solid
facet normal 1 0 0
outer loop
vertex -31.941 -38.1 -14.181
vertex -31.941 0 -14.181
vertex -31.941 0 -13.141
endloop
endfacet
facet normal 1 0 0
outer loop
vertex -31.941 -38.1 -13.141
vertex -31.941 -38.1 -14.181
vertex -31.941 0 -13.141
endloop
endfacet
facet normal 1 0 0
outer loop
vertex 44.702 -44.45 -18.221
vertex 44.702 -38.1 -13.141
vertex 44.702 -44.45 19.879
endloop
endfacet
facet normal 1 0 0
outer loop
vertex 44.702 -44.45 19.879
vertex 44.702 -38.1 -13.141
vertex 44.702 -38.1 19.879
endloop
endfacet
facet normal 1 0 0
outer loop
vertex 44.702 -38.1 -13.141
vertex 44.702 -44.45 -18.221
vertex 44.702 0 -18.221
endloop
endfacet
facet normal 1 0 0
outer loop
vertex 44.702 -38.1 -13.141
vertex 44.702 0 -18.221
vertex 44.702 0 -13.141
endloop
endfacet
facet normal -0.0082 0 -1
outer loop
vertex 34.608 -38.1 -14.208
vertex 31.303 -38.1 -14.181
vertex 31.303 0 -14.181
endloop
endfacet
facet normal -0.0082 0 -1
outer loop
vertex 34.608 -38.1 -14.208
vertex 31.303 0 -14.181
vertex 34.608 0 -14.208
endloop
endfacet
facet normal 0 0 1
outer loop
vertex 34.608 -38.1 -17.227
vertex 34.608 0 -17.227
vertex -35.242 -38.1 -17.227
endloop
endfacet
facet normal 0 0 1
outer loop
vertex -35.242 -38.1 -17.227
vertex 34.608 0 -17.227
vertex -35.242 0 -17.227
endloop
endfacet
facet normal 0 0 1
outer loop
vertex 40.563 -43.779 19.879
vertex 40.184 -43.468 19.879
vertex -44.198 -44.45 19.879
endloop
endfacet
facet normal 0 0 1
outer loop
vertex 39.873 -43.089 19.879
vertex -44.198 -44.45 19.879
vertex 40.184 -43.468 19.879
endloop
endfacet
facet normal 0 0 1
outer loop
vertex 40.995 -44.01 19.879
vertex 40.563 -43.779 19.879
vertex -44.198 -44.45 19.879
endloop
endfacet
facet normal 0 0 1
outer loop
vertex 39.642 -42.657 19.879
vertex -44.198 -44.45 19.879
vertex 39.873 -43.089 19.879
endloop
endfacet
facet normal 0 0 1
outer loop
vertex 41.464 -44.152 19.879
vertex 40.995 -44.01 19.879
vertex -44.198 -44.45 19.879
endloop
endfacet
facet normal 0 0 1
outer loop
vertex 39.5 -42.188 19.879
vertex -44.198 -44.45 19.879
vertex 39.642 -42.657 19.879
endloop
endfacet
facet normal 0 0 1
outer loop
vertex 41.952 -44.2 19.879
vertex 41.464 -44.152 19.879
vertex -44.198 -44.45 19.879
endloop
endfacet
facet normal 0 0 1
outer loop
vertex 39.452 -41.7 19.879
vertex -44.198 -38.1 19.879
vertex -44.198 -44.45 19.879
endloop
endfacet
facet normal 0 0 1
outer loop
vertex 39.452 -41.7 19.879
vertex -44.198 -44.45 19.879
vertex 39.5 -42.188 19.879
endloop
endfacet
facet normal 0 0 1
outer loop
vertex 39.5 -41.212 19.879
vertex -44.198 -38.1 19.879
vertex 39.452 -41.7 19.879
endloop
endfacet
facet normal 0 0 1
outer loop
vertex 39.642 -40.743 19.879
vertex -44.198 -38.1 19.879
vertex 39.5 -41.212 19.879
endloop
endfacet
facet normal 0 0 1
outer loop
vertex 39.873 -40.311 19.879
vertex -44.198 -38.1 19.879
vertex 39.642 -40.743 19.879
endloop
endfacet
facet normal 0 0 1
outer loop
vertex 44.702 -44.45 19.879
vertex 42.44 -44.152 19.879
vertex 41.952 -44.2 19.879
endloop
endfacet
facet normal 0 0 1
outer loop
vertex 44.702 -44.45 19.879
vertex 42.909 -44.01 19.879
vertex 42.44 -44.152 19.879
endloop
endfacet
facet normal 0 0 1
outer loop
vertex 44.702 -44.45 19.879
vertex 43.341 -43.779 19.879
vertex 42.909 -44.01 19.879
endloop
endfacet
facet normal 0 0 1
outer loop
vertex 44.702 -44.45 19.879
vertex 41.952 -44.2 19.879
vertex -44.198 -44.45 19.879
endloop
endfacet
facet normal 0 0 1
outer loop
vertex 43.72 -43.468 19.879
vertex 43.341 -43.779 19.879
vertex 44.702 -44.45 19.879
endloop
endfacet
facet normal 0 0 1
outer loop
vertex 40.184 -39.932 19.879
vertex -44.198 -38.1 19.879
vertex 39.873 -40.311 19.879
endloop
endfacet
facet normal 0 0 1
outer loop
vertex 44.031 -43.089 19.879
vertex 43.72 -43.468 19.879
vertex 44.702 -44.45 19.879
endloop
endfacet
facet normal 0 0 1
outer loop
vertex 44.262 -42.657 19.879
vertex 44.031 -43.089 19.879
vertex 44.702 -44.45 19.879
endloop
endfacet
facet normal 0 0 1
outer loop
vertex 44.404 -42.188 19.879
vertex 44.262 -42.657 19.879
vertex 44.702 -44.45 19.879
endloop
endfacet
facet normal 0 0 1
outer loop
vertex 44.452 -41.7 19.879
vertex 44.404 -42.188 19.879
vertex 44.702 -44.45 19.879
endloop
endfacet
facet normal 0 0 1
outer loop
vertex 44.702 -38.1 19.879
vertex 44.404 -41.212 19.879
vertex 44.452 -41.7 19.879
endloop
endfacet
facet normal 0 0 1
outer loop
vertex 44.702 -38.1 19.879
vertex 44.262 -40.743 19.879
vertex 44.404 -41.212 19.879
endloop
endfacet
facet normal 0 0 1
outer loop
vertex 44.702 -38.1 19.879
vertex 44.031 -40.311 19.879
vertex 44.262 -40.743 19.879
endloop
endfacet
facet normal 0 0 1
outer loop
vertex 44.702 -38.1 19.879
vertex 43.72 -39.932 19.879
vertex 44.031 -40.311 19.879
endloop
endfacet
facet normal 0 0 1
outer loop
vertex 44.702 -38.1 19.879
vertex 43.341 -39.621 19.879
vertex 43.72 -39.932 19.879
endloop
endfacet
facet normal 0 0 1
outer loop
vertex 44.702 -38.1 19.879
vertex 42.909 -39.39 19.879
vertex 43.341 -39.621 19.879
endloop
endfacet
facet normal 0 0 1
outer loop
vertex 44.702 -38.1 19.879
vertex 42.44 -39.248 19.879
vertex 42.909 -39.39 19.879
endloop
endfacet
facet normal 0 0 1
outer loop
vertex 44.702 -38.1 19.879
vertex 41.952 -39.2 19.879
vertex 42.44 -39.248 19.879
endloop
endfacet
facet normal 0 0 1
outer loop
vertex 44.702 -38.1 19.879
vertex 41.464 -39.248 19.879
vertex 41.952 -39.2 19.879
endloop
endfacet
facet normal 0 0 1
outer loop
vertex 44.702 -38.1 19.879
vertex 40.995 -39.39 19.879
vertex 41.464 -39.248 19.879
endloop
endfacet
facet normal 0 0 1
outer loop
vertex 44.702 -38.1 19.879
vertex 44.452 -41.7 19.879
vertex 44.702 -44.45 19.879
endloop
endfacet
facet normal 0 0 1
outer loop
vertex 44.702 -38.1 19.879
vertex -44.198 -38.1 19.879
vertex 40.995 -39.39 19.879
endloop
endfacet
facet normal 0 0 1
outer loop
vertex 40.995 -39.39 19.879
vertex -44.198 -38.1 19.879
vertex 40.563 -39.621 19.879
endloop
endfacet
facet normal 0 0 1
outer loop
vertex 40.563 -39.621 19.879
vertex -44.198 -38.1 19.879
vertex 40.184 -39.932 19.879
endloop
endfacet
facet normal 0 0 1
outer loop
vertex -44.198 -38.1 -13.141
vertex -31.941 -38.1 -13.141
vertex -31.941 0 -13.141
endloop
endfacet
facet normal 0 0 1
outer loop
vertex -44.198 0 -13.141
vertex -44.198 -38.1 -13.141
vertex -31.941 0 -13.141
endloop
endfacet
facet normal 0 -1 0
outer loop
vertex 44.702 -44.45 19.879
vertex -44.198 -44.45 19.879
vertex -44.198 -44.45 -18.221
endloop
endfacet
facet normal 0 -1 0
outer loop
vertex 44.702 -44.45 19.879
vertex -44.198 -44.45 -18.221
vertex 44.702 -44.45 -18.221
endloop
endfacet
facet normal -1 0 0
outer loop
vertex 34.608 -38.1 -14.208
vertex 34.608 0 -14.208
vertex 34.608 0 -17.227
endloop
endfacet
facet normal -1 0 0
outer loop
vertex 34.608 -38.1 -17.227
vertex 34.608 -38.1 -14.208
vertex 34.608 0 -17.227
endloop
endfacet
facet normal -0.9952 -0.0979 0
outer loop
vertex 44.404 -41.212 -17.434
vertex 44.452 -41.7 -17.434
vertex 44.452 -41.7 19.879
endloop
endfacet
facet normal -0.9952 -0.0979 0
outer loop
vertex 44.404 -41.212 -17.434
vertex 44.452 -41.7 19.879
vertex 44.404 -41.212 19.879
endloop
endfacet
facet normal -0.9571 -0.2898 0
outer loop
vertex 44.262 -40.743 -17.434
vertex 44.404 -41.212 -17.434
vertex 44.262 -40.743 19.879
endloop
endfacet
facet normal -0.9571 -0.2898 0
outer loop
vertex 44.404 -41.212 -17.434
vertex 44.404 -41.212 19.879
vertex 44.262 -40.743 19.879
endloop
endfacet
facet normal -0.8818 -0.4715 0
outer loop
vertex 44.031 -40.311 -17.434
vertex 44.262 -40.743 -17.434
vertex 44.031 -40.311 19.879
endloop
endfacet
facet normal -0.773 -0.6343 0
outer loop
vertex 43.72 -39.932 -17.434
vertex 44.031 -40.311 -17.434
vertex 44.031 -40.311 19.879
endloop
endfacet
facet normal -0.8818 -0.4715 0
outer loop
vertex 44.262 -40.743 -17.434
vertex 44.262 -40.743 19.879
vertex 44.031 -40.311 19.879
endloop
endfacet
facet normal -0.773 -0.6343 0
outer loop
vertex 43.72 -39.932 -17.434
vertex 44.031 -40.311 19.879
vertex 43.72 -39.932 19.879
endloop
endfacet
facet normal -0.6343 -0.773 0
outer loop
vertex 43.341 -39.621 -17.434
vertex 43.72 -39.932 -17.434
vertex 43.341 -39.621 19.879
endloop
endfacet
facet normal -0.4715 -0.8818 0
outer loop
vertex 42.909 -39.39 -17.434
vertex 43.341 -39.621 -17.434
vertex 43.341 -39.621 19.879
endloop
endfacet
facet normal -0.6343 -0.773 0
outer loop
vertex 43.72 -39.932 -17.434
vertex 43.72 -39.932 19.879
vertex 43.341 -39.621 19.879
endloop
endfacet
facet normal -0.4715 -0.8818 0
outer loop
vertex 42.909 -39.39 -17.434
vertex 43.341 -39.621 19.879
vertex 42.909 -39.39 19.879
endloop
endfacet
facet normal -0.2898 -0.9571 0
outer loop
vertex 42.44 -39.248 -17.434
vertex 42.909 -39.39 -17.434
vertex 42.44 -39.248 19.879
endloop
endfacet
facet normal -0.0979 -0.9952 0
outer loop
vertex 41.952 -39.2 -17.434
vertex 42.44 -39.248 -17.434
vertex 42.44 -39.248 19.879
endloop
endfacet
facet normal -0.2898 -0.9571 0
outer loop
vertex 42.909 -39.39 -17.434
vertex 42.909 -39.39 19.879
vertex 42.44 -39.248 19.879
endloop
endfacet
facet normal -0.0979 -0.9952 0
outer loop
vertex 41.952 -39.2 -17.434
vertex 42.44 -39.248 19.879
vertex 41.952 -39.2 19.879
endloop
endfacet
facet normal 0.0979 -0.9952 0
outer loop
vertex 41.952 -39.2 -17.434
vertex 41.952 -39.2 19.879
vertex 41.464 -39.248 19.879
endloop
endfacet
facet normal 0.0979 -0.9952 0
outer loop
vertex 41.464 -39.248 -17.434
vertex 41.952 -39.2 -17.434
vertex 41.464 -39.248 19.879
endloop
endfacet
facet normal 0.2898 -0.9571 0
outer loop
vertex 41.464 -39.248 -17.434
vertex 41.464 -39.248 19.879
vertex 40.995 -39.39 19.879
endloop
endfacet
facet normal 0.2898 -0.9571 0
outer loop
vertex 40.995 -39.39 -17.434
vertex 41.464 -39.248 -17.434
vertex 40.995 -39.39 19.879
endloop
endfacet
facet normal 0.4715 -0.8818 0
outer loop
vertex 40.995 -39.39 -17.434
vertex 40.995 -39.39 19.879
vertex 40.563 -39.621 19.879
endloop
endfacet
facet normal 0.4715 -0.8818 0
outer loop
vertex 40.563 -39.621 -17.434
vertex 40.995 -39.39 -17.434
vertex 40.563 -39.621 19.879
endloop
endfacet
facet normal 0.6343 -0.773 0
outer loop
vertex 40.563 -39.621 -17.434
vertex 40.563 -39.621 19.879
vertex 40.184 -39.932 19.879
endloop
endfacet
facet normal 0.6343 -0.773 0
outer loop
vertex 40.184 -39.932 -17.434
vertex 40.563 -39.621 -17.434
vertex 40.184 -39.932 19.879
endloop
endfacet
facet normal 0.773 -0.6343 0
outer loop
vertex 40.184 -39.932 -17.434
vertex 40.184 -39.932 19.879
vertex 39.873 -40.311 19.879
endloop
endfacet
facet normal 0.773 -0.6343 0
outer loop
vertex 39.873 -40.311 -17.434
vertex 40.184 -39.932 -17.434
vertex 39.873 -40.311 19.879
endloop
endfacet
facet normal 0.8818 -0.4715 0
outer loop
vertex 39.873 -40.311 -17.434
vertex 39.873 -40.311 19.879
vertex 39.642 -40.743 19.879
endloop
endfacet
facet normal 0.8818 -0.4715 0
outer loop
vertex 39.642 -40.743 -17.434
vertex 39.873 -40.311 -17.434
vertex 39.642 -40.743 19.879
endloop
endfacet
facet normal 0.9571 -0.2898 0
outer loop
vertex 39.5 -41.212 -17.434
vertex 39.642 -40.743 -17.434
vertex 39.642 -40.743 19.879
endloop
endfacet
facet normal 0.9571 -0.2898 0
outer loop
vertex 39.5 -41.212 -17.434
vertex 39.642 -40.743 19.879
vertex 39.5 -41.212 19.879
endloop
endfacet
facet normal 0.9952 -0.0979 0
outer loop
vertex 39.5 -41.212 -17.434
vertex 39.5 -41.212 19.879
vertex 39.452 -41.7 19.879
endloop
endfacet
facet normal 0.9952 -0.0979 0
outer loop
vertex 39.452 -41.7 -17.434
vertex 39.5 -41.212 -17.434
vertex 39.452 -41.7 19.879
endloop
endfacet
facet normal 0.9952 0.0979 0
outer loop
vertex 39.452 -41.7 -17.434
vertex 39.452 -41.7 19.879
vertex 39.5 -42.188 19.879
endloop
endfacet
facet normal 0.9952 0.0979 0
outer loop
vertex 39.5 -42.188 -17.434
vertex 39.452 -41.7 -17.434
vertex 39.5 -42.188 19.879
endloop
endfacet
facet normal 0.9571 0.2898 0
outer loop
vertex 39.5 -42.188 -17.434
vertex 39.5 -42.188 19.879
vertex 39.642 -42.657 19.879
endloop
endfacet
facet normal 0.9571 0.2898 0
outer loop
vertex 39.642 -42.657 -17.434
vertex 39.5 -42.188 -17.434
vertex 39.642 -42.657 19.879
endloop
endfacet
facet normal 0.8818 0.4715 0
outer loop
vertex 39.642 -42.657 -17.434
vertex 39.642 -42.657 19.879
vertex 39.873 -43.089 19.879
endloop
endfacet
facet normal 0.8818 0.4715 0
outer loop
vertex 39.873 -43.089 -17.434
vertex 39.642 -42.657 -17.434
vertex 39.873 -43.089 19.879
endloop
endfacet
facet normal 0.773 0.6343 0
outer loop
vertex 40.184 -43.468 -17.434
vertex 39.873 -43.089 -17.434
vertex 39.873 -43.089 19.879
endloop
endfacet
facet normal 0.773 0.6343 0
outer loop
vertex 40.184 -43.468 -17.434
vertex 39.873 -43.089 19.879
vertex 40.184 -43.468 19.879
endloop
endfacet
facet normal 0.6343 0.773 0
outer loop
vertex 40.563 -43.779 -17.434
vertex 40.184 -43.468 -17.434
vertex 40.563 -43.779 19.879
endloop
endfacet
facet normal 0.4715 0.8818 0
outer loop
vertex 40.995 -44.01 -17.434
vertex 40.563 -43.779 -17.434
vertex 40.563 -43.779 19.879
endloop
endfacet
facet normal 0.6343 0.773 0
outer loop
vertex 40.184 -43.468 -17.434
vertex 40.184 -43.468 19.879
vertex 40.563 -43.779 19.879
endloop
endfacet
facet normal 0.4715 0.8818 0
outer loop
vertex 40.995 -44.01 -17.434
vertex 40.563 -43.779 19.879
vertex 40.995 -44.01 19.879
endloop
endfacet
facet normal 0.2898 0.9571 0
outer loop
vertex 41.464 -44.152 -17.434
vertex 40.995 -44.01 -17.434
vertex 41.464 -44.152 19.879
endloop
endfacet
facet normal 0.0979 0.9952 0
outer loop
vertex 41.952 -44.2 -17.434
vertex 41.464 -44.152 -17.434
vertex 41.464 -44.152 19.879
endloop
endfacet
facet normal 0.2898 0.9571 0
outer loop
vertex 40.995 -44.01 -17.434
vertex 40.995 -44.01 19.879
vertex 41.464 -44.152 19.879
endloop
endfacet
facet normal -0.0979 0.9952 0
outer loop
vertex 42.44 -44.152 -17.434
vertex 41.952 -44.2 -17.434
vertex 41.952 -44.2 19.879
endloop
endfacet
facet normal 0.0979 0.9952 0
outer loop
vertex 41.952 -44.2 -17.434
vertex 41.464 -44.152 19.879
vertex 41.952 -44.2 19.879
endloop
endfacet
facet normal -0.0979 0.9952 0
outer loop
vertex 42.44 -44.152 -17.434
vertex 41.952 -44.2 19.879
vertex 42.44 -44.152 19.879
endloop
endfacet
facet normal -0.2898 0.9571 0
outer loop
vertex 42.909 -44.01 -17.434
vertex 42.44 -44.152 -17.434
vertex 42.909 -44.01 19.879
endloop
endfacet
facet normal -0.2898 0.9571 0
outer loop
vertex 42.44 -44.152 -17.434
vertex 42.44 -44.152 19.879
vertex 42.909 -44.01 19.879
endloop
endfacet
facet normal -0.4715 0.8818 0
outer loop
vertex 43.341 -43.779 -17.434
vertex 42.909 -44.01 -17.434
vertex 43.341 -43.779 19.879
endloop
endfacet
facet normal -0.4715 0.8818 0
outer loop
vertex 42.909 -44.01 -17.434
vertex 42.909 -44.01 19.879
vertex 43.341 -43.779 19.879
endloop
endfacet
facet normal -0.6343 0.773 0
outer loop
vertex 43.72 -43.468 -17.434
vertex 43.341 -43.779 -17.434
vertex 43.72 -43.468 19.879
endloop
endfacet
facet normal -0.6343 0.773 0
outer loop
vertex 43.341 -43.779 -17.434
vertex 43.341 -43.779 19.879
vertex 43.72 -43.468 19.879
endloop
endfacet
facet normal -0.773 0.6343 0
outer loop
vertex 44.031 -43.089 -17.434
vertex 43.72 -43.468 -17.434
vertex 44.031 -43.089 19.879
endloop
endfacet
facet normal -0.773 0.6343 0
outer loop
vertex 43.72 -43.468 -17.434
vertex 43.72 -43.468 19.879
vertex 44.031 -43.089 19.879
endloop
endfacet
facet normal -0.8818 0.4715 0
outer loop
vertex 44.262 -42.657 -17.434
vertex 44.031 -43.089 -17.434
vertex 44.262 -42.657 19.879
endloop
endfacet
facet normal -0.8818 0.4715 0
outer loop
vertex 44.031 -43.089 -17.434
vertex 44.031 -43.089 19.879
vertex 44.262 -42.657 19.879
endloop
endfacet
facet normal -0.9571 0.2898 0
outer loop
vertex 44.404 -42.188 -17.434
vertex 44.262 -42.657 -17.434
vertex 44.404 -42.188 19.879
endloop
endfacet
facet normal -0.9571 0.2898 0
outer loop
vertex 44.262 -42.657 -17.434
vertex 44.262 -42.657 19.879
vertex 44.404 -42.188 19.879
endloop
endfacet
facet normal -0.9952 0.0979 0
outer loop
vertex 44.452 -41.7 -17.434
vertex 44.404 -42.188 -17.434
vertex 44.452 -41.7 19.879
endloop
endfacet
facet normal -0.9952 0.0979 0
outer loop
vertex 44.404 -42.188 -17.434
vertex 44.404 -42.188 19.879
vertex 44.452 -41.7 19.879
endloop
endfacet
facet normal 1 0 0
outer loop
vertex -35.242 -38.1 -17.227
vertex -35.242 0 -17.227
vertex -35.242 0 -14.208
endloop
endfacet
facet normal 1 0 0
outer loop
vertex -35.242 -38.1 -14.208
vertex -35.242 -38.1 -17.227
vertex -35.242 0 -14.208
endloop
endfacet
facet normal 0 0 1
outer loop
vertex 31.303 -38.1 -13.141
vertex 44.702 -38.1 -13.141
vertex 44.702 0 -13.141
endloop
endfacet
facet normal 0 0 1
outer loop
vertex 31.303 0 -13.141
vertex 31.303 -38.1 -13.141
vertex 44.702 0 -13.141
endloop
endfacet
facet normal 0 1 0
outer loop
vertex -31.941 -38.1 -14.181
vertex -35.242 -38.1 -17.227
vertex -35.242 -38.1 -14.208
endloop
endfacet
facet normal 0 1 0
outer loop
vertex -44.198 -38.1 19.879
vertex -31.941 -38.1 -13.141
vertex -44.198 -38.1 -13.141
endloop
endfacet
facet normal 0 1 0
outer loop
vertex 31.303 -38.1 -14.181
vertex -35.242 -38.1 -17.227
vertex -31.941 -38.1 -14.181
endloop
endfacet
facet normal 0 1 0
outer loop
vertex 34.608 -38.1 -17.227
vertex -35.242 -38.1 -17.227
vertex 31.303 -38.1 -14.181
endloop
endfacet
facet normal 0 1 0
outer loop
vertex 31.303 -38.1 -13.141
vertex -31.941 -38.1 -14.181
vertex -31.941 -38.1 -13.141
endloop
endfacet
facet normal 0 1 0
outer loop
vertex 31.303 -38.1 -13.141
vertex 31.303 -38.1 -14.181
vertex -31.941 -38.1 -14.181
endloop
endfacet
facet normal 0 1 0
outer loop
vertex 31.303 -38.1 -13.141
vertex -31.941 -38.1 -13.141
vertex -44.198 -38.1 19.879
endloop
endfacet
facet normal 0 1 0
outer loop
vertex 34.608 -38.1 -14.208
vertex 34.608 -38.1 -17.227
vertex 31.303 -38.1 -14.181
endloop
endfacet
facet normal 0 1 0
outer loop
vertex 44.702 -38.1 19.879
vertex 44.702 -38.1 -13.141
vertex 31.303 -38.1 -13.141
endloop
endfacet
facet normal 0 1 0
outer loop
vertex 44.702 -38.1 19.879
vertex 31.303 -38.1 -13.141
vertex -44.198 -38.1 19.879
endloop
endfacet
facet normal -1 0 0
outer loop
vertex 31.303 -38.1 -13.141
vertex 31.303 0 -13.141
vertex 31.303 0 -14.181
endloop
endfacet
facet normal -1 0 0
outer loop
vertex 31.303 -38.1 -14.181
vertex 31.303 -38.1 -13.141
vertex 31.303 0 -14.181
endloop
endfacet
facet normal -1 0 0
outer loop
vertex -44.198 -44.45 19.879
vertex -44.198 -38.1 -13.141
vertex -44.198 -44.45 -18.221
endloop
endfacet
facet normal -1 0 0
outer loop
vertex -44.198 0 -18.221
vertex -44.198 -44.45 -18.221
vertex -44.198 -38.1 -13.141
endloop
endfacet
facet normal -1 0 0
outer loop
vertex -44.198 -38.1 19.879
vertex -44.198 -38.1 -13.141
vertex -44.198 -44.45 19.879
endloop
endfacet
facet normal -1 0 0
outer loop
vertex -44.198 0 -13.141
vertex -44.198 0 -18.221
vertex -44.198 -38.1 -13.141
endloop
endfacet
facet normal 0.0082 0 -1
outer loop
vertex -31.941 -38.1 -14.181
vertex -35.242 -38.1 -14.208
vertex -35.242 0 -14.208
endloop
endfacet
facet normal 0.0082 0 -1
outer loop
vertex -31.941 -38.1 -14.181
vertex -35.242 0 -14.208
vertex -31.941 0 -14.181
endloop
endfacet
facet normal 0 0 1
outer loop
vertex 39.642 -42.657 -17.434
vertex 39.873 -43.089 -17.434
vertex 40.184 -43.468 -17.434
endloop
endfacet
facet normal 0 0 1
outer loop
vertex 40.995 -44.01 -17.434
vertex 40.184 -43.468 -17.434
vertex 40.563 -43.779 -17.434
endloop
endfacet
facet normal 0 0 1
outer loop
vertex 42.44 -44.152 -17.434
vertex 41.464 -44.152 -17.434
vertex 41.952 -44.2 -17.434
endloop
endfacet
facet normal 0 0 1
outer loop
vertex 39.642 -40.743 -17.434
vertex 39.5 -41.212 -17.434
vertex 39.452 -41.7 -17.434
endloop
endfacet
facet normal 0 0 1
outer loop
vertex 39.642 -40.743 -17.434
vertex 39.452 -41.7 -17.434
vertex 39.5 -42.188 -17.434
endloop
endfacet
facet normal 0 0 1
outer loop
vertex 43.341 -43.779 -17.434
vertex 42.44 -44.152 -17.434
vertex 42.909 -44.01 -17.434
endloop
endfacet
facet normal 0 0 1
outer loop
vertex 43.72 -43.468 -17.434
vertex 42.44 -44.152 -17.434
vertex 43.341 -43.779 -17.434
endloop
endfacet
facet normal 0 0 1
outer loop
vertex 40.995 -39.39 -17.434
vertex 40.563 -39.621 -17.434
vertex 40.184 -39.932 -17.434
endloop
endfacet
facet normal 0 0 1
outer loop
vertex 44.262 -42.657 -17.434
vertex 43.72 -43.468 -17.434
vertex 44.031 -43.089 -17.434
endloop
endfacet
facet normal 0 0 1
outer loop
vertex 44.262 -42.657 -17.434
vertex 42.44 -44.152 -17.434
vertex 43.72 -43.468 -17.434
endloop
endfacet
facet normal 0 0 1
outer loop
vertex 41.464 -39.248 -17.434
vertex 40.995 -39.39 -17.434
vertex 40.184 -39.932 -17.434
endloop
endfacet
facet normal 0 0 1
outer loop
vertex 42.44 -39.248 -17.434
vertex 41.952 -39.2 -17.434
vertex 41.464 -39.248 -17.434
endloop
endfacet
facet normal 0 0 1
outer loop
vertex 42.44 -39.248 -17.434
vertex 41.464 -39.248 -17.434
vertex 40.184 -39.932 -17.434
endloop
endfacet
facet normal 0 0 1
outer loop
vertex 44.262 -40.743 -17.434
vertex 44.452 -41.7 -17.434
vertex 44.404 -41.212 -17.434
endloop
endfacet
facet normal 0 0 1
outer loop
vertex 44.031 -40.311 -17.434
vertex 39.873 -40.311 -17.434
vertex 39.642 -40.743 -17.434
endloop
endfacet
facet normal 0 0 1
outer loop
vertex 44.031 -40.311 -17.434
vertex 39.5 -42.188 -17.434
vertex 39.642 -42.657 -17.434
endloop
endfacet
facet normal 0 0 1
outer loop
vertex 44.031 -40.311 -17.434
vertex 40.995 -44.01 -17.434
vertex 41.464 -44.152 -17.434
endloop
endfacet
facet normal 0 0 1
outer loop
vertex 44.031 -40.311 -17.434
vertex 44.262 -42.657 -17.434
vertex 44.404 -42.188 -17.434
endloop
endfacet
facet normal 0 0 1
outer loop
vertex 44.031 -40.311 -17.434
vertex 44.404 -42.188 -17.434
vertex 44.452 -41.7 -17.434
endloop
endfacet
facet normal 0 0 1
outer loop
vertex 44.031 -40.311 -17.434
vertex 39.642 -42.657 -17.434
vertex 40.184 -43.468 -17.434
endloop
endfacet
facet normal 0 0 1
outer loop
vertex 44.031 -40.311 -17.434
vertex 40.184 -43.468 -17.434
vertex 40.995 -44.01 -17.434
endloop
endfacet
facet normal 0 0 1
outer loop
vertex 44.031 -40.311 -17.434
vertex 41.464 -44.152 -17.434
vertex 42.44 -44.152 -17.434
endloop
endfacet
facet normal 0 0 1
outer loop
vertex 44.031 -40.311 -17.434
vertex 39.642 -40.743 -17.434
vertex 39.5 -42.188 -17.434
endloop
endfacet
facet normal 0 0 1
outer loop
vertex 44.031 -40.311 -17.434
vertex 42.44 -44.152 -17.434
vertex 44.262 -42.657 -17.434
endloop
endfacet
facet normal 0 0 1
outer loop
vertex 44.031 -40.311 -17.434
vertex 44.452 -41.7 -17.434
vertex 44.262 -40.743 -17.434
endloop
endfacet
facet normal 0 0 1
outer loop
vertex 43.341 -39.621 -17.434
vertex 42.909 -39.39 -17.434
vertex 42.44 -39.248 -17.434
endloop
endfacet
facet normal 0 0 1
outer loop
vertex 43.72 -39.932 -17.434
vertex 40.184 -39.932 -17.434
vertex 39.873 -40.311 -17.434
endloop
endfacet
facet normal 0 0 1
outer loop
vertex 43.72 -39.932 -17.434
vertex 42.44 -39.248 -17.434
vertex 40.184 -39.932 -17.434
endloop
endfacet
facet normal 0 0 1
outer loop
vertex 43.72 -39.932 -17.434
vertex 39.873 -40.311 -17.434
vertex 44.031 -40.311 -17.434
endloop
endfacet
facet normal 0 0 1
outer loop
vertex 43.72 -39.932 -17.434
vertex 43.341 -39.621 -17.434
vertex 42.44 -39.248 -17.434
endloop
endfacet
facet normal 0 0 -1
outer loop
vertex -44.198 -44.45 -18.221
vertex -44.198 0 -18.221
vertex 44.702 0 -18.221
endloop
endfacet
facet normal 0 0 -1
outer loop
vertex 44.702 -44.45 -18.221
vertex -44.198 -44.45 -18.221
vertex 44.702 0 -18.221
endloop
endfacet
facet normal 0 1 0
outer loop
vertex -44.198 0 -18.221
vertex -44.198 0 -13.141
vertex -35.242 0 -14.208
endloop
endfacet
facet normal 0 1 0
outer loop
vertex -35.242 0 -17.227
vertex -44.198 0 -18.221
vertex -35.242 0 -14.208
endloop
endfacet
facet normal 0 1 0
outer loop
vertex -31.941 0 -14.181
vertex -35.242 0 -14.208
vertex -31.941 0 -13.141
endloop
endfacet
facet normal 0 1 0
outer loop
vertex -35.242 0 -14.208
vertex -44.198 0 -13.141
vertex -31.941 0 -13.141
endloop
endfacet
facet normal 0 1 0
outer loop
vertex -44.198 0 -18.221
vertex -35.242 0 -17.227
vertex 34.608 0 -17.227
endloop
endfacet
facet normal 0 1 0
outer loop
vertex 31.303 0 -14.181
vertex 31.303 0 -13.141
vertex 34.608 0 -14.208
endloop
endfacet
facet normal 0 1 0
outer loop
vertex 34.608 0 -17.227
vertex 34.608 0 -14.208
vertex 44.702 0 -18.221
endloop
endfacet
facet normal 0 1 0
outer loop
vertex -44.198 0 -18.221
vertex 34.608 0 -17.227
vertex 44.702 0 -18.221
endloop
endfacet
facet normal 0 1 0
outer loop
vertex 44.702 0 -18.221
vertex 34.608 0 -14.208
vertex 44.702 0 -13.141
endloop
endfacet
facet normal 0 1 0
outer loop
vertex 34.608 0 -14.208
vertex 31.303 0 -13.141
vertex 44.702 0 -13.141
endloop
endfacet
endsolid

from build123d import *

# Parameters (mm, degrees)
F0_W          = 88.9
F0_H          = 38.1
F1_DEPTH      = 44.45
F2_W          = 38.1
F2_H          = 33.02
F3_DEPTH      = 88.901
F4_W          = 5.5
F4_H          = 5.5
F5_DEPTH      = 36.068
F6_R          = 2.5
F7_DEPTH      = 37.3126
F7_DEPTH_BACK = 1
F9_DEPTH      = 38.1


with BuildPart() as f1:
    # F0 (on Front) → F1 (new body)
    with BuildSketch(Plane.XZ):
        with Locations((0.251959, 0.828608)):
            Rectangle(F0_W, F0_H)
    extrude(amount=F1_DEPTH)

    # F2 (on face) → F3 (cut, through all)
    with BuildSketch(Plane.YZ.offset(44.701959)):
        with Locations((-19.05, 3.368608)):
            Rectangle(F2_W, F2_H)
    extrude(amount=-F3_DEPTH, mode=Mode.SUBTRACT)

    # F4 (on face) → F5 (join)
    with BuildSketch(Plane.XY.offset(19.878608)):
        with Locations((41.951959, -41.7)):
            Rectangle(F4_W, F4_H)
    extrude(amount=-F5_DEPTH)

    # F6 (on face) → F7 (cut, two sides)
    with BuildSketch(Plane.XY.offset(19.878608)) as f7_sk:
        with Locations((41.951959, -41.7)):
            Circle(F6_R)
    extrude(amount=-F7_DEPTH, mode=Mode.SUBTRACT)
    extrude(f7_sk.sketch, amount=-F7_DEPTH_BACK, mode=Mode.SUBTRACT)

    # F8 (on face) → F9 (cut)
    with BuildSketch(Plane(origin=(0, 0, 0), x_dir=(-1, 0, 0), z_dir=(0, 1, 0))):
        Polygon((-34.6075, -14.208194), (-34.6075, -17.227376), (35.2425, -17.227376), (35.2425, -14.208194), (31.940609, -14.181392), (31.940609, -13.141392), (-31.302892, -13.141392), (-31.302892, -14.181392), align=None)
    extrude(amount=-F9_DEPTH, mode=Mode.SUBTRACT)


solid = f1.part
